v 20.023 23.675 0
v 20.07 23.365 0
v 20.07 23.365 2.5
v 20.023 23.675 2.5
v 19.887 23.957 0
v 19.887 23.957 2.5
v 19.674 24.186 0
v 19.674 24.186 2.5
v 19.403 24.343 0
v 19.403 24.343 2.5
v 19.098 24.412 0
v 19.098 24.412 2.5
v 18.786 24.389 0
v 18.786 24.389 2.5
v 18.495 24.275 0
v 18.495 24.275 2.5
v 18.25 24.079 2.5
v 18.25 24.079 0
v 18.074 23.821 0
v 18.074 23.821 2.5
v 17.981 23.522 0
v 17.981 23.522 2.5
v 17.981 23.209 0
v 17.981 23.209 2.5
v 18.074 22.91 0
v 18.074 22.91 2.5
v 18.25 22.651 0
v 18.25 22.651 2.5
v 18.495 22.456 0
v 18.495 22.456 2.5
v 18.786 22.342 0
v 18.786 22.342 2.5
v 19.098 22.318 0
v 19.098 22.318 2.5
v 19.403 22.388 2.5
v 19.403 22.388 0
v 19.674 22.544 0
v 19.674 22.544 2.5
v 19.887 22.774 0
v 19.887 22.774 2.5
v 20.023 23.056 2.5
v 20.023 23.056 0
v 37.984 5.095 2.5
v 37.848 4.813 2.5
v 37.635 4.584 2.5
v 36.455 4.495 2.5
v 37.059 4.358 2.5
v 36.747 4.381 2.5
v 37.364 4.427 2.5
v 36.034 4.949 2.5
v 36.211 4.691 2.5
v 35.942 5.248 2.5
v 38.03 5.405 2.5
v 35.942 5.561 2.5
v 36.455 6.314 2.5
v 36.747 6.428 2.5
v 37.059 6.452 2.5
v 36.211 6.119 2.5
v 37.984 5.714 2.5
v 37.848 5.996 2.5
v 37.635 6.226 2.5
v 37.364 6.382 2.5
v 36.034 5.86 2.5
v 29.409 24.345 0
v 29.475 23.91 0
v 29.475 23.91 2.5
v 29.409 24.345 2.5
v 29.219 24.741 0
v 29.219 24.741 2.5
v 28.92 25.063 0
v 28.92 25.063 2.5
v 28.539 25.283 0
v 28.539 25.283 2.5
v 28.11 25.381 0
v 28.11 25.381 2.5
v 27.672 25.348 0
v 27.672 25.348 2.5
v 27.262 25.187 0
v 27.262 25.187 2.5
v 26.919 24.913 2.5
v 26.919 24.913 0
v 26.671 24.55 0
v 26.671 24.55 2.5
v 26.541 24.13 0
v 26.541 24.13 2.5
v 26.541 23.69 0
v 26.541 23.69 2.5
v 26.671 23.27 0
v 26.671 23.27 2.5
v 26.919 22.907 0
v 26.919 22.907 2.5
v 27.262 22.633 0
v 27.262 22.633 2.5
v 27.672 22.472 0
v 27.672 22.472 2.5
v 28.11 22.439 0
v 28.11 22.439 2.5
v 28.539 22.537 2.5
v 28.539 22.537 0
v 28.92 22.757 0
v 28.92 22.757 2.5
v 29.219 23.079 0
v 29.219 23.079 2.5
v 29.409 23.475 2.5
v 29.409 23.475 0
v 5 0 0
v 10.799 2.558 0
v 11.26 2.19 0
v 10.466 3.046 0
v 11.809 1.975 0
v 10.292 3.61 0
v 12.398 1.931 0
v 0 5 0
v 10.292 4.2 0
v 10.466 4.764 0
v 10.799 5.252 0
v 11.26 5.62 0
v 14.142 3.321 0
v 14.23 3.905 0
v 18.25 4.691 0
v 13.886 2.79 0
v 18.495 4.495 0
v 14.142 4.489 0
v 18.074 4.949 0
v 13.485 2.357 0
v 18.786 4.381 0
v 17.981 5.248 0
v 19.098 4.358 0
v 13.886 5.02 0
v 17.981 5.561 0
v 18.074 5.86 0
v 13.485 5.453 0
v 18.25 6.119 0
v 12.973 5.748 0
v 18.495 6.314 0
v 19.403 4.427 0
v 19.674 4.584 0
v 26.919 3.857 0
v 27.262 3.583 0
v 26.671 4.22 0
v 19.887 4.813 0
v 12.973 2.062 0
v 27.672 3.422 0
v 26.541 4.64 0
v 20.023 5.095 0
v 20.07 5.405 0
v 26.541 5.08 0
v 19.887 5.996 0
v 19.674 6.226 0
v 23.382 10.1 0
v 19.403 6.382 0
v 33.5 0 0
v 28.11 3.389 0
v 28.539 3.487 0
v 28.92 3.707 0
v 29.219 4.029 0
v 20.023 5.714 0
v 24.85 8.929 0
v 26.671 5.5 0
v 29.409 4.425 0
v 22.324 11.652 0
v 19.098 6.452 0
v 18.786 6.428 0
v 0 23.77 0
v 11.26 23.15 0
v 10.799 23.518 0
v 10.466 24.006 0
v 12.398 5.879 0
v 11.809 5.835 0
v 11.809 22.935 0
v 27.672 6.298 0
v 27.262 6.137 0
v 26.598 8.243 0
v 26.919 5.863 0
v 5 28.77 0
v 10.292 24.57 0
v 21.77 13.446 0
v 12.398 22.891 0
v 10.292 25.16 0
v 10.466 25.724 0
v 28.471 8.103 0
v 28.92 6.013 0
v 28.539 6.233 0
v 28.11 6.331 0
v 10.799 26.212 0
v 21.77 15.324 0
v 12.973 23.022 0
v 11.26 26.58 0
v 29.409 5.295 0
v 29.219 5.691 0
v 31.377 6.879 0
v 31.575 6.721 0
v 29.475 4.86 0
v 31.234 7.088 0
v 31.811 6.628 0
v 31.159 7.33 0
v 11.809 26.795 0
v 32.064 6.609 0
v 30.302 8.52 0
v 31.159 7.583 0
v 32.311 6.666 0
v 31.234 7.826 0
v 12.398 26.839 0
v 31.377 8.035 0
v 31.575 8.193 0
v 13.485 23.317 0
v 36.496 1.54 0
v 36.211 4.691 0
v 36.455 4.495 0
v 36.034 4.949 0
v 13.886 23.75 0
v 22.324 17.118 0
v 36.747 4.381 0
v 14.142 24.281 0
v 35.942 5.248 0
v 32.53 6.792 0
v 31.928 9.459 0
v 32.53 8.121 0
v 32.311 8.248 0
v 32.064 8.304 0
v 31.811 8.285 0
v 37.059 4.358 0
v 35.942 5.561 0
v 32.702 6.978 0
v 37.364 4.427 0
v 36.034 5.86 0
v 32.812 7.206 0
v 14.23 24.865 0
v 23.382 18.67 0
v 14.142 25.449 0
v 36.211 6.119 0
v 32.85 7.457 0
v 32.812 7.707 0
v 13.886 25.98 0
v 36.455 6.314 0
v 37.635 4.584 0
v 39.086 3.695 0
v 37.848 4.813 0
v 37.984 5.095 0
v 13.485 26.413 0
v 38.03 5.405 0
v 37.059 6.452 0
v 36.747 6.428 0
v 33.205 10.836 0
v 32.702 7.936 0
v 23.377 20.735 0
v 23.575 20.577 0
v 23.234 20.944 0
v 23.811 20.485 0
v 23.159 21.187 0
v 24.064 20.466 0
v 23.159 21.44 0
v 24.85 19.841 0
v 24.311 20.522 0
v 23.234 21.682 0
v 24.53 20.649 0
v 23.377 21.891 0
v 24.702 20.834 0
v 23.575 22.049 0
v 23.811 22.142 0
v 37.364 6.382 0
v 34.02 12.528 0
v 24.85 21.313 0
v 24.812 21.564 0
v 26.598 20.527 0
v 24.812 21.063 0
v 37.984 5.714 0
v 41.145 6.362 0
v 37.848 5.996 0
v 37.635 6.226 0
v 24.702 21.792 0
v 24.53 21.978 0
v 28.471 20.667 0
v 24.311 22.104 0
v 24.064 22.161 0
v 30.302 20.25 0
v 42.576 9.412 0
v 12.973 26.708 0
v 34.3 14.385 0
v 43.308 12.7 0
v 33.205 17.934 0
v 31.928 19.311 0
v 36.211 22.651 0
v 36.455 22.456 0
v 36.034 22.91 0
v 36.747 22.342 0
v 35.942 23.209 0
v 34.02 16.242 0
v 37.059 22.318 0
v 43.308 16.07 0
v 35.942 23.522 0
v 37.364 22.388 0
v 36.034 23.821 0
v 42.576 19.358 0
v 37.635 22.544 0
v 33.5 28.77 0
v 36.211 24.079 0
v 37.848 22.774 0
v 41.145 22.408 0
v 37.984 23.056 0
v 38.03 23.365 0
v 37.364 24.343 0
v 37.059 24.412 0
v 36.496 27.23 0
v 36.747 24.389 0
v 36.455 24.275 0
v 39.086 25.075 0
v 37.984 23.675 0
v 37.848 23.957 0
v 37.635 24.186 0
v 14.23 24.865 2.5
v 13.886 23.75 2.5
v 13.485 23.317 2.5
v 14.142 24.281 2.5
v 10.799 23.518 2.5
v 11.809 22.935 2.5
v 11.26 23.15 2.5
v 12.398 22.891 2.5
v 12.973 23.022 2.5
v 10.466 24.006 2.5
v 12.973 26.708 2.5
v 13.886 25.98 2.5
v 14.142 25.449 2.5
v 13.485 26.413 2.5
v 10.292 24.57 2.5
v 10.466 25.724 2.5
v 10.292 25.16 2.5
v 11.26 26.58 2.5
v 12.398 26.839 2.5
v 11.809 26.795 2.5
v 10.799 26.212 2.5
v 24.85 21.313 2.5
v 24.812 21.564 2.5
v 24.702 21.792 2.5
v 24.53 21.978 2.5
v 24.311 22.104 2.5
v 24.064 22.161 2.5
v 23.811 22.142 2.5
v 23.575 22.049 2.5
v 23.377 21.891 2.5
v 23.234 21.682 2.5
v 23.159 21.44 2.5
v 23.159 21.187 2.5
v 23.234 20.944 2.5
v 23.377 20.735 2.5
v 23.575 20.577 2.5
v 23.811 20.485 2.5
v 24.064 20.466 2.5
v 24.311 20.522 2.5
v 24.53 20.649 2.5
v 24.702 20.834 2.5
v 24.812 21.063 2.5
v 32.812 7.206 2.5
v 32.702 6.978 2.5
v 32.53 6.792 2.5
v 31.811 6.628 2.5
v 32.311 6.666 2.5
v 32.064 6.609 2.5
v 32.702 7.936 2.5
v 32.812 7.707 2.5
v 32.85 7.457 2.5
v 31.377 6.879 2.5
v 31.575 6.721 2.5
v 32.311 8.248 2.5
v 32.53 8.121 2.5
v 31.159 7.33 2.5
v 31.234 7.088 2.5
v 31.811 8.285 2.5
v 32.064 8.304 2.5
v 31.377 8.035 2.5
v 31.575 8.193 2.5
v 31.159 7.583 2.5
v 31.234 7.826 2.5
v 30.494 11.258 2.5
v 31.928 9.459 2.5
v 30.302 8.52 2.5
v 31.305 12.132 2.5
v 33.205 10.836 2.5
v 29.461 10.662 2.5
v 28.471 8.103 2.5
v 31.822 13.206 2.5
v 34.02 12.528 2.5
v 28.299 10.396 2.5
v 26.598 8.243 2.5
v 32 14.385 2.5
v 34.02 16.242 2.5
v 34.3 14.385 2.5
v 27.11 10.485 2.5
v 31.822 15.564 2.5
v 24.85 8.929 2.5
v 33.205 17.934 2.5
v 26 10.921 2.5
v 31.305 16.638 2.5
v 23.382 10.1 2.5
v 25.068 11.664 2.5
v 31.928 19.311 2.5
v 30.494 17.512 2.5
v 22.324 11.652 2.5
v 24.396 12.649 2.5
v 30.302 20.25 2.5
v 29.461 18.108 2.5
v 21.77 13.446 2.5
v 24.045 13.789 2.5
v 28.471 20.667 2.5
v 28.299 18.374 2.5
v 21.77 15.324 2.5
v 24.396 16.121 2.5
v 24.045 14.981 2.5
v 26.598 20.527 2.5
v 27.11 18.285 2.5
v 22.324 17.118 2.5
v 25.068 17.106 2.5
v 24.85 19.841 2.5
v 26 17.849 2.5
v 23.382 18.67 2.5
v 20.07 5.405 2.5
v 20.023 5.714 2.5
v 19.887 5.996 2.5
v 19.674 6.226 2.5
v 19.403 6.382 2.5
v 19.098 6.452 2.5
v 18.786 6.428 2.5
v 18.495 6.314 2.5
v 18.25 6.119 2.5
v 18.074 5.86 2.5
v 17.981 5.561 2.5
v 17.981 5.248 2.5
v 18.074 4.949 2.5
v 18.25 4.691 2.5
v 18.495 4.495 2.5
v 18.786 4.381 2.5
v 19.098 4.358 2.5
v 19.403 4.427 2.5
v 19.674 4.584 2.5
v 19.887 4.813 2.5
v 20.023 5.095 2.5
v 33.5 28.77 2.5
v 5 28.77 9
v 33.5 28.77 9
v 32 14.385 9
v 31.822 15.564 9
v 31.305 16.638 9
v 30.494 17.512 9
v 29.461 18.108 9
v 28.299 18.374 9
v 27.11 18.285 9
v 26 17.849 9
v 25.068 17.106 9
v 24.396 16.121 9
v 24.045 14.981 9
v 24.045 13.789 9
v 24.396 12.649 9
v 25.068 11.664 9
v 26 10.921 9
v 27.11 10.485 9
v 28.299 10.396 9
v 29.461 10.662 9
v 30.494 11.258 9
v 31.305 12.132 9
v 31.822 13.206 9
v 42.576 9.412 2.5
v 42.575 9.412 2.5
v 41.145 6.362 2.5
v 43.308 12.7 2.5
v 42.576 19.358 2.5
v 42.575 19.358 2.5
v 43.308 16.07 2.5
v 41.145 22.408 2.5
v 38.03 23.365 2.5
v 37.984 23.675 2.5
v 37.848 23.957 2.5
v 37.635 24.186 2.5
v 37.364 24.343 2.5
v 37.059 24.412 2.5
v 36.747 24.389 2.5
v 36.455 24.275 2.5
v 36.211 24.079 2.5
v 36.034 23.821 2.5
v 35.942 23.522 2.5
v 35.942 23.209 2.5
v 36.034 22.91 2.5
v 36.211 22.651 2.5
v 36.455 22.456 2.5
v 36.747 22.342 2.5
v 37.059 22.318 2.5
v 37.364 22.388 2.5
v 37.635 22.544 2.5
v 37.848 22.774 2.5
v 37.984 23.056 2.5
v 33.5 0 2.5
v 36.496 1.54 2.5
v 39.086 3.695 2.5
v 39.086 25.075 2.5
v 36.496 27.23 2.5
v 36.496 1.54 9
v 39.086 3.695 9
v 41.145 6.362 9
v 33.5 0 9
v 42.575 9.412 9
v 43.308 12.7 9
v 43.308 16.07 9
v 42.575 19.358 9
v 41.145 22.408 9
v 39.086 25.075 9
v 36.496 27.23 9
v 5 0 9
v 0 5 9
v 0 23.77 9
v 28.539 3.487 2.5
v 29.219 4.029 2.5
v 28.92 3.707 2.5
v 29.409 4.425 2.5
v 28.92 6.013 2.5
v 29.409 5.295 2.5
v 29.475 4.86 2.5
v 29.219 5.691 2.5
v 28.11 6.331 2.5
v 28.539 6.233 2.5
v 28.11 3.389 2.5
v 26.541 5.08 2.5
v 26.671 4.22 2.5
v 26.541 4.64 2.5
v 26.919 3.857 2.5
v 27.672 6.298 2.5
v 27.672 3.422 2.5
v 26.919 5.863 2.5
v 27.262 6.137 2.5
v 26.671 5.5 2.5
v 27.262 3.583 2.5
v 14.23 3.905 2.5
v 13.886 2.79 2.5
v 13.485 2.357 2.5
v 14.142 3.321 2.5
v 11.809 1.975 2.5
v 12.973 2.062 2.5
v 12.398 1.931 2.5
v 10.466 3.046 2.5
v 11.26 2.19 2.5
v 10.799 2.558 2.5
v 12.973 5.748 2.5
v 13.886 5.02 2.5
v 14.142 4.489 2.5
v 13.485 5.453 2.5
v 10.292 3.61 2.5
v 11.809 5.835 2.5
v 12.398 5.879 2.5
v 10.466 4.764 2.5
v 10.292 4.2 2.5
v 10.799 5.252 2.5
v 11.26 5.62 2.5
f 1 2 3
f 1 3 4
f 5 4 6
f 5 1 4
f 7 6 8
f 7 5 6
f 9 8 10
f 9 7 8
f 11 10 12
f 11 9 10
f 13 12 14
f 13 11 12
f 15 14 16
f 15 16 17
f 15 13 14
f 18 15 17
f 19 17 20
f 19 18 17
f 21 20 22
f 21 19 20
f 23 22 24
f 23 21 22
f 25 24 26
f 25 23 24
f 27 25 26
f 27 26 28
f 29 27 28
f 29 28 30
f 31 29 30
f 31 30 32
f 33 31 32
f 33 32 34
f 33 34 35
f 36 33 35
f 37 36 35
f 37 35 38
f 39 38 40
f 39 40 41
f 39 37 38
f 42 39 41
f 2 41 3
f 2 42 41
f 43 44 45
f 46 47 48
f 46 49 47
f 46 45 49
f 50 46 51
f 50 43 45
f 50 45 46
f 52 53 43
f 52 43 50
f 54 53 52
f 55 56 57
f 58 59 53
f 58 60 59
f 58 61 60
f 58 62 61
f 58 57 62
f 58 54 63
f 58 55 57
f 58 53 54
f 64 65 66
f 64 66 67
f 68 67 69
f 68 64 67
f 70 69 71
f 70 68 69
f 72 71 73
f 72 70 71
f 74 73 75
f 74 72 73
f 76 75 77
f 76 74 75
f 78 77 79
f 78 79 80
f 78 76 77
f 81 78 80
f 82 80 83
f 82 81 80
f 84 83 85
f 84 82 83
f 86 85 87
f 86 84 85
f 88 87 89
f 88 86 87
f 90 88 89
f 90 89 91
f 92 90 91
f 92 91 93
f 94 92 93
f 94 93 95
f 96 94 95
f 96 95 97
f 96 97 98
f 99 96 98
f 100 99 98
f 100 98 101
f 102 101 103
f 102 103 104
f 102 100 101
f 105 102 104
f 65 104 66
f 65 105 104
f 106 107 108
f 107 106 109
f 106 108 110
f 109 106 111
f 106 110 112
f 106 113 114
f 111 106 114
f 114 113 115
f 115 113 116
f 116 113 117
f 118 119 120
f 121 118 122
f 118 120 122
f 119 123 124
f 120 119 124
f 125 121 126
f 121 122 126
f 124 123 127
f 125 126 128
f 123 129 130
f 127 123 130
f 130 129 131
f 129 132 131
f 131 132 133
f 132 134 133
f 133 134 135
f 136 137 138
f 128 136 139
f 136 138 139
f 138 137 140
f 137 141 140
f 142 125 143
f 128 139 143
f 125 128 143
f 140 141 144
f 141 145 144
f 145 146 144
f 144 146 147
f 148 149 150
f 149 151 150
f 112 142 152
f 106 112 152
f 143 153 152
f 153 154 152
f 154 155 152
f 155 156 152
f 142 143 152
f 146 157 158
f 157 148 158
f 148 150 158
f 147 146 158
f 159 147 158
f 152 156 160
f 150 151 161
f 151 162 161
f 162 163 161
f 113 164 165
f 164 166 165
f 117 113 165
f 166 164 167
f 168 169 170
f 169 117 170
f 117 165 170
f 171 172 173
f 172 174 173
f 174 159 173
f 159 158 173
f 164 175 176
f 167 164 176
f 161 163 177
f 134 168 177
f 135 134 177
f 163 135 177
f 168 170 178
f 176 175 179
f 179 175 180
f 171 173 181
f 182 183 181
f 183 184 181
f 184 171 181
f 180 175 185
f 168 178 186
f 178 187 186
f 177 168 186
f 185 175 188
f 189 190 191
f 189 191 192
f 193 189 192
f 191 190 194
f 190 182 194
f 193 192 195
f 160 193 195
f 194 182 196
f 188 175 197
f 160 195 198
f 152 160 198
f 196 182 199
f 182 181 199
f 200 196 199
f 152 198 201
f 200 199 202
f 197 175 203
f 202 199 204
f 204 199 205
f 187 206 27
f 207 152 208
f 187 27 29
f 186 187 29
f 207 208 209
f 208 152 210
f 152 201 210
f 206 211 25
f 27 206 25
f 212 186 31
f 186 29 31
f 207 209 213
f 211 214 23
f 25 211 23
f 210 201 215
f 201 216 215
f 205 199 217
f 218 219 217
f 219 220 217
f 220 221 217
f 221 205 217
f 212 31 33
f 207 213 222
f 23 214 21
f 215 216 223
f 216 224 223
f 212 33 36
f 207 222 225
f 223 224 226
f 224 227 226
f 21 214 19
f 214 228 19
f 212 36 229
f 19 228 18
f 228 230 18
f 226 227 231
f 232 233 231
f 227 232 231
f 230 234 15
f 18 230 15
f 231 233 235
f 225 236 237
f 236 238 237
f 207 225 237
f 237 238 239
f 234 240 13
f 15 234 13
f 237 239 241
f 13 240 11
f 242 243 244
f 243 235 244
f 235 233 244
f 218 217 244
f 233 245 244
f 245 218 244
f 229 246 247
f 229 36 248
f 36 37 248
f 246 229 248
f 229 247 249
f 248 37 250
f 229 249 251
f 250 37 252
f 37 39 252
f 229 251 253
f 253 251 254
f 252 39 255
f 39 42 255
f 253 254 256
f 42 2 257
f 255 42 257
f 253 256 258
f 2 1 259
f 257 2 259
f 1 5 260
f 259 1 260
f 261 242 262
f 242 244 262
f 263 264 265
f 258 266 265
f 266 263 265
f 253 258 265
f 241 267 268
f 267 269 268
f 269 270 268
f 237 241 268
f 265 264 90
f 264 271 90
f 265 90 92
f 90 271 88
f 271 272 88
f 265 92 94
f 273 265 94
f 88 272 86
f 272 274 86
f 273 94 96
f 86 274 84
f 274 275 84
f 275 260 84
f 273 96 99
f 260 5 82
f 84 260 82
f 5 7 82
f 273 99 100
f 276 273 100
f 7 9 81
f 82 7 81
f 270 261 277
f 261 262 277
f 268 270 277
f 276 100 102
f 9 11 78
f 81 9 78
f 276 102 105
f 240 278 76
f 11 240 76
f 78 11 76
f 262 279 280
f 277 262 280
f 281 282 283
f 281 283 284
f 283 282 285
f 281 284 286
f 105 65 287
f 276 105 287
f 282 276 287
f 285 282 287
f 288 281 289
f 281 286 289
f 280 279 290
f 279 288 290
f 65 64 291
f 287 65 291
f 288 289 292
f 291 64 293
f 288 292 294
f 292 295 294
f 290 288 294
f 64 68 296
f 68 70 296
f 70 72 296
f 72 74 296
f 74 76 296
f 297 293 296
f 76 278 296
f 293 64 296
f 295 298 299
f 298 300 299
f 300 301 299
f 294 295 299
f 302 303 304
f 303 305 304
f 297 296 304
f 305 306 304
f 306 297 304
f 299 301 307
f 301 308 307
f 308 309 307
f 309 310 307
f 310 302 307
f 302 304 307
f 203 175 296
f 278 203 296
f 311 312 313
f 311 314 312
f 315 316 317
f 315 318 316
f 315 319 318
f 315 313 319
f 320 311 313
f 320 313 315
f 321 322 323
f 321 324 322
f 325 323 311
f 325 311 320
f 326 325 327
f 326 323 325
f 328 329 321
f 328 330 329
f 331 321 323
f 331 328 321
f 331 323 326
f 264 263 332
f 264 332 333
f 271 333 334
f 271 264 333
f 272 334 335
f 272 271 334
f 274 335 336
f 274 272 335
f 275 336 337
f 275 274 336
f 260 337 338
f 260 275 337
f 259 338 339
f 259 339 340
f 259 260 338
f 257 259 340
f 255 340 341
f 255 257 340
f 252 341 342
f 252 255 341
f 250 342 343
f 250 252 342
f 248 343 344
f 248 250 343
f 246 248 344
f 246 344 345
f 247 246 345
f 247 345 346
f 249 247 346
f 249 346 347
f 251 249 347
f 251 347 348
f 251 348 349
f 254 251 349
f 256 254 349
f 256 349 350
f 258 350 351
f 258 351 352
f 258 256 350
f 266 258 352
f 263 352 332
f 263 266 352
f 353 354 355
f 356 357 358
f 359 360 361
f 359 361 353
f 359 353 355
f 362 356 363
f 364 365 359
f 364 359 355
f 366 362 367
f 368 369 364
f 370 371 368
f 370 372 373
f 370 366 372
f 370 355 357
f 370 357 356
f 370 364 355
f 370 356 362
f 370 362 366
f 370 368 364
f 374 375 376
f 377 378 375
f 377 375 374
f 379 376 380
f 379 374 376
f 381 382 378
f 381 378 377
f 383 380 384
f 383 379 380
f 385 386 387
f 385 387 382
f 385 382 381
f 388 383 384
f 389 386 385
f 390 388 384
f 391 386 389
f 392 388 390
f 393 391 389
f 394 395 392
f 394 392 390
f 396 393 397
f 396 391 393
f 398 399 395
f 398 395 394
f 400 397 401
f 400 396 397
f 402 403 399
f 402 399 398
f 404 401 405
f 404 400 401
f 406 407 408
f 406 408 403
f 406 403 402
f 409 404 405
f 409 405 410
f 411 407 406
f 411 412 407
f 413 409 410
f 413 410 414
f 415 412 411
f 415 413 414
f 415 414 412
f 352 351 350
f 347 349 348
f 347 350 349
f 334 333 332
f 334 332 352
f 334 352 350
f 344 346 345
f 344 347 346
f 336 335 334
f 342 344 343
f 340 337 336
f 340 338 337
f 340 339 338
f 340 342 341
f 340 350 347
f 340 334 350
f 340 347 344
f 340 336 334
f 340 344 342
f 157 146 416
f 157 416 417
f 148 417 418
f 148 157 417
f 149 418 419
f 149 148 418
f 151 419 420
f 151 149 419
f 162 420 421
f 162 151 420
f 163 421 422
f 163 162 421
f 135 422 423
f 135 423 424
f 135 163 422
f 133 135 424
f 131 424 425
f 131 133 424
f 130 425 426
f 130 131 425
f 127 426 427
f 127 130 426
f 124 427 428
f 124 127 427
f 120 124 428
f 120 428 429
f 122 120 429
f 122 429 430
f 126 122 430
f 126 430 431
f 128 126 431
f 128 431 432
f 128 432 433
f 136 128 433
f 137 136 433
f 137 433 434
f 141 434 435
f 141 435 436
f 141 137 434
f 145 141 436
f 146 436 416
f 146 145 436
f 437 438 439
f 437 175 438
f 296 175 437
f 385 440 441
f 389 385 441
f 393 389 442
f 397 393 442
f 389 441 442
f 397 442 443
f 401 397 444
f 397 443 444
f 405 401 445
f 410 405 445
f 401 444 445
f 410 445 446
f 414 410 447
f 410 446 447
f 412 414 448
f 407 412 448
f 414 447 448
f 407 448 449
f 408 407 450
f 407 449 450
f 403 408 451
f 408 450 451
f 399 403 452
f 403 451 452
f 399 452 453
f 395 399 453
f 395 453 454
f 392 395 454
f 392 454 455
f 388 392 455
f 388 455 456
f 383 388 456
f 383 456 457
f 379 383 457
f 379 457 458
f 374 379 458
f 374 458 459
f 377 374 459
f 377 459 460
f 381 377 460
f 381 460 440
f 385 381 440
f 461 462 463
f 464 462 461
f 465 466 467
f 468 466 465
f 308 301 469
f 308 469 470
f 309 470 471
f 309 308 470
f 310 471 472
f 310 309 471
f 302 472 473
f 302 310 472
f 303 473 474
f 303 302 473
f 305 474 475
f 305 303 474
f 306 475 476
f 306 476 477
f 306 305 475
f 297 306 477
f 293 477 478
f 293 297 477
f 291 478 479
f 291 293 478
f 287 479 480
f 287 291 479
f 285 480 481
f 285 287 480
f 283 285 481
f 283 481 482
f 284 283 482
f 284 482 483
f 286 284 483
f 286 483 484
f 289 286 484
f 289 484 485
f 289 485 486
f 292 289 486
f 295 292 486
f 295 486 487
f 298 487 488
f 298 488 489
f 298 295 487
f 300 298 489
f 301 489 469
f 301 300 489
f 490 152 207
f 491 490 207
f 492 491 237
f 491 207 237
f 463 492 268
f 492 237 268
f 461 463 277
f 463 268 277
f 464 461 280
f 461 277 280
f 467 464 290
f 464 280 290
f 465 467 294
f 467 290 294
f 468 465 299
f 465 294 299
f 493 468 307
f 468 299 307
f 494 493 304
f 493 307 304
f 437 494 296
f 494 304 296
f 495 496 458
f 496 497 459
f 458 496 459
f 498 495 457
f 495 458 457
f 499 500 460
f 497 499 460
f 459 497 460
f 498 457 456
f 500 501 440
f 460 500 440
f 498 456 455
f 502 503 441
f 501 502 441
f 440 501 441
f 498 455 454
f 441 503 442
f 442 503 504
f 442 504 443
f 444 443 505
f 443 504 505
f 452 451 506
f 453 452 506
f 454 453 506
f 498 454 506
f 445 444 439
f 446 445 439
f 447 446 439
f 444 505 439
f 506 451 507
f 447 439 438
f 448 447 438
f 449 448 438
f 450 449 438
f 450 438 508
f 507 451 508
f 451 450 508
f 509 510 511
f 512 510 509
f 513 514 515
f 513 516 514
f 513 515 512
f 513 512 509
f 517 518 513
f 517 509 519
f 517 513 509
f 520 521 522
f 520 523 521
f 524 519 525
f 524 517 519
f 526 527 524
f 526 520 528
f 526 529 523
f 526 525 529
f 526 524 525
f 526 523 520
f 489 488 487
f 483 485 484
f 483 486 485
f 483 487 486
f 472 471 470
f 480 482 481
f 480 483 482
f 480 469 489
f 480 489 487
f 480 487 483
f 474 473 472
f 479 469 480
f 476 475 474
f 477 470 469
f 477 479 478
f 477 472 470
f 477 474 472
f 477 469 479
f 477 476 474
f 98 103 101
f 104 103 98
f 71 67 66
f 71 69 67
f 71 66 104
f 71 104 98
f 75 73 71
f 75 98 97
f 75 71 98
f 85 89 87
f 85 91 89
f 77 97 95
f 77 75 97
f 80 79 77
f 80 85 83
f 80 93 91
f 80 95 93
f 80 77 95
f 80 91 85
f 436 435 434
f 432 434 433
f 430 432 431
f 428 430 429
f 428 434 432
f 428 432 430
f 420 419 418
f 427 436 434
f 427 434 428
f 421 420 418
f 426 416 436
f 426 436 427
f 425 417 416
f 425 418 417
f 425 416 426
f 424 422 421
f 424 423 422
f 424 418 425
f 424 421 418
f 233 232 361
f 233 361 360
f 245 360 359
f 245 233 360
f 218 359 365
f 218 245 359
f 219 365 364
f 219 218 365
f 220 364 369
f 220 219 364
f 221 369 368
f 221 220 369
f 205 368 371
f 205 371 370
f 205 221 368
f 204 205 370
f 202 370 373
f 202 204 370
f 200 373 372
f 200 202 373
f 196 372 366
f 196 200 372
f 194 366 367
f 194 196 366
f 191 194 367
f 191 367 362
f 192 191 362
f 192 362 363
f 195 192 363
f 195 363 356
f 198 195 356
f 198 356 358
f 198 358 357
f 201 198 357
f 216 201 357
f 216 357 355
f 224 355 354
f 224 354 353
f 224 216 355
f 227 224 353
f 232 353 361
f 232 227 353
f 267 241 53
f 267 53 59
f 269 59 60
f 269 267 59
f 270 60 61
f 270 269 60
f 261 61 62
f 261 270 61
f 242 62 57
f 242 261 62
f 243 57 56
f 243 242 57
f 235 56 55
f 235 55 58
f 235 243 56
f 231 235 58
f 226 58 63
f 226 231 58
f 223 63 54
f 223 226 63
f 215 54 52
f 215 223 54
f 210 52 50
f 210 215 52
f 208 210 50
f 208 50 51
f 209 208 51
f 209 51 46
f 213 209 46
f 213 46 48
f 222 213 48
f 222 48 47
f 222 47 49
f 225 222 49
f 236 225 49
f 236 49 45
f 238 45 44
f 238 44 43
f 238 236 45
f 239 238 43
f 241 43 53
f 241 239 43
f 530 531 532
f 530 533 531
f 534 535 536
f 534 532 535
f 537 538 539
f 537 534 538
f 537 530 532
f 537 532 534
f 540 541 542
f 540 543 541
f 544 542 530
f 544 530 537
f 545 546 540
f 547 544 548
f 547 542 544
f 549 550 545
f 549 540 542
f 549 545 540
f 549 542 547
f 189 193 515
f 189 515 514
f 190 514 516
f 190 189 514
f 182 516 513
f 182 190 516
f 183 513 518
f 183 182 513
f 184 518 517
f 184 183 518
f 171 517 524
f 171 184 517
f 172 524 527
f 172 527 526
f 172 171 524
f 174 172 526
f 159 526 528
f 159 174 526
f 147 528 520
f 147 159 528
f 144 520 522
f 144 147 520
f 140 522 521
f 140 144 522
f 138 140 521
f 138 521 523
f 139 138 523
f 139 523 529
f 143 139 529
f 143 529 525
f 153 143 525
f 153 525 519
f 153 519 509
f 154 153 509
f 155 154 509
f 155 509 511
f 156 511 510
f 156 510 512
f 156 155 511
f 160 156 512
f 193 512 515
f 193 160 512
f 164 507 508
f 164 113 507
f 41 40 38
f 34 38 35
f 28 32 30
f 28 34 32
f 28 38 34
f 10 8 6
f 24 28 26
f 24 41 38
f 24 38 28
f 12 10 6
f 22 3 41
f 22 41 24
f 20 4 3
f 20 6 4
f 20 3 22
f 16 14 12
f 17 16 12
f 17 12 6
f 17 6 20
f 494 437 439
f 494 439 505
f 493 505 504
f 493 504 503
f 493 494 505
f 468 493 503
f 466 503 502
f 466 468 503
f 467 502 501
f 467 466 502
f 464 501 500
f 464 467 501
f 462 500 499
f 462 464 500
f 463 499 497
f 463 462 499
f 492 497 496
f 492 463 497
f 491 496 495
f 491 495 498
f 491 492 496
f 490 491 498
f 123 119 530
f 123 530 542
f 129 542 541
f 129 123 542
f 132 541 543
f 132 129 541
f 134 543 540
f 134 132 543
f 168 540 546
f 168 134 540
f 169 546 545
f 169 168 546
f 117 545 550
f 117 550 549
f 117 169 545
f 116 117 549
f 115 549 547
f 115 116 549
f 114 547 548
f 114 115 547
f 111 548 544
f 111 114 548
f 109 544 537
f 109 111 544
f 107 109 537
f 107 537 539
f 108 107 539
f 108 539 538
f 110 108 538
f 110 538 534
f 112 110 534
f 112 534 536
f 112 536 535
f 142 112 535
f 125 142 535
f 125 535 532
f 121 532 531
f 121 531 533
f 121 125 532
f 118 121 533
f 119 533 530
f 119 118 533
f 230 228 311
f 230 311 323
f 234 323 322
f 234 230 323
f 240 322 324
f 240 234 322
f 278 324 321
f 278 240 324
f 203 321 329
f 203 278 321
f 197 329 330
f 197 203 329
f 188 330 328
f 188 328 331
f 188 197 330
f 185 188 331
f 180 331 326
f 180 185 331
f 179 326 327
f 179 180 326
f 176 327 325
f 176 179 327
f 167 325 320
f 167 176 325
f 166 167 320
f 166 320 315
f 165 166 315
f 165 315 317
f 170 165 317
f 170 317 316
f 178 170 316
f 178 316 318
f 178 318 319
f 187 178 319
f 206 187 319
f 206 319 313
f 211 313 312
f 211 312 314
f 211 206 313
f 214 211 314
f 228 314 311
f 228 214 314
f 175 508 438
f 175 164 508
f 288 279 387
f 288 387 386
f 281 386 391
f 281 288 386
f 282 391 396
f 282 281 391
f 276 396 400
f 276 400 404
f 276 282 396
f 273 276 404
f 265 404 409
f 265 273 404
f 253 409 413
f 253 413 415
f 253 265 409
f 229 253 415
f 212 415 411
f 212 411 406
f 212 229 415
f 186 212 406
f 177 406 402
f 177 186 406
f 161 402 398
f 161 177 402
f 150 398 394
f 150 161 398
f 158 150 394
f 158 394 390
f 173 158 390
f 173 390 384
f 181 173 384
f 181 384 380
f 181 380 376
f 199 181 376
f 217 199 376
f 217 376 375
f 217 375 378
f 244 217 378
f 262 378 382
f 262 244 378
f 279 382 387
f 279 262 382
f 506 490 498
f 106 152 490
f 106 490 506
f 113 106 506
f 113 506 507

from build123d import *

# Parameters (mm, degrees)
ESQUISSE1_R             = 1.98
ESQUISSE1_R_2           = 6.3
ESQUISSE1_R_3           = 1.475
ESQUISSE1_R_4           = 1.05
ESQUISSE1_R_5           = 0.85
BOSS_EXTRU_2_DEPTH      = 2.5
BOSS_EXTRU_3_DEPTH      = 6.5
ESQUISSE3_R             = 4
ENL_V_MAT_EXTRU_1_DEPTH = 10


with BuildPart() as part:
    # Esquisse1 → Boss.-Extru.2 (new body)
    with BuildSketch(Plane.XY):
        with BuildLine():
            Line((22.5, 28.77), (5, 28.77))
            Line((5, 28.77), (0, 23.77))
            Line((0, 23.77), (0, 5))
            Line((0, 5), (5, 0))
            Line((5, 0), (22.5, 0))
            Line((22.5, 0), (33.5, 0))
            ThreePointArc((33.5, 0), (43.400591709, 14.385), (33.5, 28.77))
            Line((33.5, 28.77), (22.5, 28.77))
        make_face()
        with Locations((12.25, 3.905)):
            Circle(ESQUISSE1_R, mode=Mode.SUBTRACT)
        with Locations((12.25, 24.865)):
            Circle(ESQUISSE1_R, mode=Mode.SUBTRACT)
        with Locations((28, 14.385)):
            Circle(ESQUISSE1_R_2, mode=Mode.SUBTRACT)
        with Locations((28, 4.86)):
            Circle(ESQUISSE1_R_3, mode=Mode.SUBTRACT)
        with Locations((28, 23.91)):
            Circle(ESQUISSE1_R_3, mode=Mode.SUBTRACT)
        with Locations((36.980256121, 5.404743879)):
            Circle(ESQUISSE1_R_4, mode=Mode.SUBTRACT)
        with Locations((36.980256121, 23.365256121)):
            Circle(ESQUISSE1_R_4, mode=Mode.SUBTRACT)
        with Locations((19.019743879, 23.365256121)):
            Circle(ESQUISSE1_R_4, mode=Mode.SUBTRACT)
        with Locations((19.019743879, 5.404743879)):
            Circle(ESQUISSE1_R_4, mode=Mode.SUBTRACT)
        with Locations((24, 21.31320323)):
            Circle(ESQUISSE1_R_5, mode=Mode.SUBTRACT)
        with Locations((32, 7.45679677)):
            Circle(ESQUISSE1_R_5, mode=Mode.SUBTRACT)
    extrude(amount=BOSS_EXTRU_2_DEPTH)

    # Esquisse2 → Boss.-Extru.3 (add)
    with BuildSketch(Plane.XY.offset(2.5)):
        with BuildLine():
            Line((5, 28.77), (33.5, 28.77))
            ThreePointArc((33.5, 28.77), (43.400493129, 14.385), (33.5, 0))
            Line((33.5, 0), (5, 0))
            Line((5, 0), (0, 5))
            Line((0, 5), (0, 23.77))
            Line((0, 23.77), (5, 28.77))
        make_face()
    extrude(amount=BOSS_EXTRU_3_DEPTH)

    # Esquisse3 → Enlèv. mat.-Extru.1 (cut)
    with BuildSketch(Plane.XY.offset(9)):
        with Locations((27.999846655, 14.385)):
            Circle(ESQUISSE3_R)
    extrude(amount=-ENL_V_MAT_EXTRU_1_DEPTH, mode=Mode.SUBTRACT)


solid = part.part
